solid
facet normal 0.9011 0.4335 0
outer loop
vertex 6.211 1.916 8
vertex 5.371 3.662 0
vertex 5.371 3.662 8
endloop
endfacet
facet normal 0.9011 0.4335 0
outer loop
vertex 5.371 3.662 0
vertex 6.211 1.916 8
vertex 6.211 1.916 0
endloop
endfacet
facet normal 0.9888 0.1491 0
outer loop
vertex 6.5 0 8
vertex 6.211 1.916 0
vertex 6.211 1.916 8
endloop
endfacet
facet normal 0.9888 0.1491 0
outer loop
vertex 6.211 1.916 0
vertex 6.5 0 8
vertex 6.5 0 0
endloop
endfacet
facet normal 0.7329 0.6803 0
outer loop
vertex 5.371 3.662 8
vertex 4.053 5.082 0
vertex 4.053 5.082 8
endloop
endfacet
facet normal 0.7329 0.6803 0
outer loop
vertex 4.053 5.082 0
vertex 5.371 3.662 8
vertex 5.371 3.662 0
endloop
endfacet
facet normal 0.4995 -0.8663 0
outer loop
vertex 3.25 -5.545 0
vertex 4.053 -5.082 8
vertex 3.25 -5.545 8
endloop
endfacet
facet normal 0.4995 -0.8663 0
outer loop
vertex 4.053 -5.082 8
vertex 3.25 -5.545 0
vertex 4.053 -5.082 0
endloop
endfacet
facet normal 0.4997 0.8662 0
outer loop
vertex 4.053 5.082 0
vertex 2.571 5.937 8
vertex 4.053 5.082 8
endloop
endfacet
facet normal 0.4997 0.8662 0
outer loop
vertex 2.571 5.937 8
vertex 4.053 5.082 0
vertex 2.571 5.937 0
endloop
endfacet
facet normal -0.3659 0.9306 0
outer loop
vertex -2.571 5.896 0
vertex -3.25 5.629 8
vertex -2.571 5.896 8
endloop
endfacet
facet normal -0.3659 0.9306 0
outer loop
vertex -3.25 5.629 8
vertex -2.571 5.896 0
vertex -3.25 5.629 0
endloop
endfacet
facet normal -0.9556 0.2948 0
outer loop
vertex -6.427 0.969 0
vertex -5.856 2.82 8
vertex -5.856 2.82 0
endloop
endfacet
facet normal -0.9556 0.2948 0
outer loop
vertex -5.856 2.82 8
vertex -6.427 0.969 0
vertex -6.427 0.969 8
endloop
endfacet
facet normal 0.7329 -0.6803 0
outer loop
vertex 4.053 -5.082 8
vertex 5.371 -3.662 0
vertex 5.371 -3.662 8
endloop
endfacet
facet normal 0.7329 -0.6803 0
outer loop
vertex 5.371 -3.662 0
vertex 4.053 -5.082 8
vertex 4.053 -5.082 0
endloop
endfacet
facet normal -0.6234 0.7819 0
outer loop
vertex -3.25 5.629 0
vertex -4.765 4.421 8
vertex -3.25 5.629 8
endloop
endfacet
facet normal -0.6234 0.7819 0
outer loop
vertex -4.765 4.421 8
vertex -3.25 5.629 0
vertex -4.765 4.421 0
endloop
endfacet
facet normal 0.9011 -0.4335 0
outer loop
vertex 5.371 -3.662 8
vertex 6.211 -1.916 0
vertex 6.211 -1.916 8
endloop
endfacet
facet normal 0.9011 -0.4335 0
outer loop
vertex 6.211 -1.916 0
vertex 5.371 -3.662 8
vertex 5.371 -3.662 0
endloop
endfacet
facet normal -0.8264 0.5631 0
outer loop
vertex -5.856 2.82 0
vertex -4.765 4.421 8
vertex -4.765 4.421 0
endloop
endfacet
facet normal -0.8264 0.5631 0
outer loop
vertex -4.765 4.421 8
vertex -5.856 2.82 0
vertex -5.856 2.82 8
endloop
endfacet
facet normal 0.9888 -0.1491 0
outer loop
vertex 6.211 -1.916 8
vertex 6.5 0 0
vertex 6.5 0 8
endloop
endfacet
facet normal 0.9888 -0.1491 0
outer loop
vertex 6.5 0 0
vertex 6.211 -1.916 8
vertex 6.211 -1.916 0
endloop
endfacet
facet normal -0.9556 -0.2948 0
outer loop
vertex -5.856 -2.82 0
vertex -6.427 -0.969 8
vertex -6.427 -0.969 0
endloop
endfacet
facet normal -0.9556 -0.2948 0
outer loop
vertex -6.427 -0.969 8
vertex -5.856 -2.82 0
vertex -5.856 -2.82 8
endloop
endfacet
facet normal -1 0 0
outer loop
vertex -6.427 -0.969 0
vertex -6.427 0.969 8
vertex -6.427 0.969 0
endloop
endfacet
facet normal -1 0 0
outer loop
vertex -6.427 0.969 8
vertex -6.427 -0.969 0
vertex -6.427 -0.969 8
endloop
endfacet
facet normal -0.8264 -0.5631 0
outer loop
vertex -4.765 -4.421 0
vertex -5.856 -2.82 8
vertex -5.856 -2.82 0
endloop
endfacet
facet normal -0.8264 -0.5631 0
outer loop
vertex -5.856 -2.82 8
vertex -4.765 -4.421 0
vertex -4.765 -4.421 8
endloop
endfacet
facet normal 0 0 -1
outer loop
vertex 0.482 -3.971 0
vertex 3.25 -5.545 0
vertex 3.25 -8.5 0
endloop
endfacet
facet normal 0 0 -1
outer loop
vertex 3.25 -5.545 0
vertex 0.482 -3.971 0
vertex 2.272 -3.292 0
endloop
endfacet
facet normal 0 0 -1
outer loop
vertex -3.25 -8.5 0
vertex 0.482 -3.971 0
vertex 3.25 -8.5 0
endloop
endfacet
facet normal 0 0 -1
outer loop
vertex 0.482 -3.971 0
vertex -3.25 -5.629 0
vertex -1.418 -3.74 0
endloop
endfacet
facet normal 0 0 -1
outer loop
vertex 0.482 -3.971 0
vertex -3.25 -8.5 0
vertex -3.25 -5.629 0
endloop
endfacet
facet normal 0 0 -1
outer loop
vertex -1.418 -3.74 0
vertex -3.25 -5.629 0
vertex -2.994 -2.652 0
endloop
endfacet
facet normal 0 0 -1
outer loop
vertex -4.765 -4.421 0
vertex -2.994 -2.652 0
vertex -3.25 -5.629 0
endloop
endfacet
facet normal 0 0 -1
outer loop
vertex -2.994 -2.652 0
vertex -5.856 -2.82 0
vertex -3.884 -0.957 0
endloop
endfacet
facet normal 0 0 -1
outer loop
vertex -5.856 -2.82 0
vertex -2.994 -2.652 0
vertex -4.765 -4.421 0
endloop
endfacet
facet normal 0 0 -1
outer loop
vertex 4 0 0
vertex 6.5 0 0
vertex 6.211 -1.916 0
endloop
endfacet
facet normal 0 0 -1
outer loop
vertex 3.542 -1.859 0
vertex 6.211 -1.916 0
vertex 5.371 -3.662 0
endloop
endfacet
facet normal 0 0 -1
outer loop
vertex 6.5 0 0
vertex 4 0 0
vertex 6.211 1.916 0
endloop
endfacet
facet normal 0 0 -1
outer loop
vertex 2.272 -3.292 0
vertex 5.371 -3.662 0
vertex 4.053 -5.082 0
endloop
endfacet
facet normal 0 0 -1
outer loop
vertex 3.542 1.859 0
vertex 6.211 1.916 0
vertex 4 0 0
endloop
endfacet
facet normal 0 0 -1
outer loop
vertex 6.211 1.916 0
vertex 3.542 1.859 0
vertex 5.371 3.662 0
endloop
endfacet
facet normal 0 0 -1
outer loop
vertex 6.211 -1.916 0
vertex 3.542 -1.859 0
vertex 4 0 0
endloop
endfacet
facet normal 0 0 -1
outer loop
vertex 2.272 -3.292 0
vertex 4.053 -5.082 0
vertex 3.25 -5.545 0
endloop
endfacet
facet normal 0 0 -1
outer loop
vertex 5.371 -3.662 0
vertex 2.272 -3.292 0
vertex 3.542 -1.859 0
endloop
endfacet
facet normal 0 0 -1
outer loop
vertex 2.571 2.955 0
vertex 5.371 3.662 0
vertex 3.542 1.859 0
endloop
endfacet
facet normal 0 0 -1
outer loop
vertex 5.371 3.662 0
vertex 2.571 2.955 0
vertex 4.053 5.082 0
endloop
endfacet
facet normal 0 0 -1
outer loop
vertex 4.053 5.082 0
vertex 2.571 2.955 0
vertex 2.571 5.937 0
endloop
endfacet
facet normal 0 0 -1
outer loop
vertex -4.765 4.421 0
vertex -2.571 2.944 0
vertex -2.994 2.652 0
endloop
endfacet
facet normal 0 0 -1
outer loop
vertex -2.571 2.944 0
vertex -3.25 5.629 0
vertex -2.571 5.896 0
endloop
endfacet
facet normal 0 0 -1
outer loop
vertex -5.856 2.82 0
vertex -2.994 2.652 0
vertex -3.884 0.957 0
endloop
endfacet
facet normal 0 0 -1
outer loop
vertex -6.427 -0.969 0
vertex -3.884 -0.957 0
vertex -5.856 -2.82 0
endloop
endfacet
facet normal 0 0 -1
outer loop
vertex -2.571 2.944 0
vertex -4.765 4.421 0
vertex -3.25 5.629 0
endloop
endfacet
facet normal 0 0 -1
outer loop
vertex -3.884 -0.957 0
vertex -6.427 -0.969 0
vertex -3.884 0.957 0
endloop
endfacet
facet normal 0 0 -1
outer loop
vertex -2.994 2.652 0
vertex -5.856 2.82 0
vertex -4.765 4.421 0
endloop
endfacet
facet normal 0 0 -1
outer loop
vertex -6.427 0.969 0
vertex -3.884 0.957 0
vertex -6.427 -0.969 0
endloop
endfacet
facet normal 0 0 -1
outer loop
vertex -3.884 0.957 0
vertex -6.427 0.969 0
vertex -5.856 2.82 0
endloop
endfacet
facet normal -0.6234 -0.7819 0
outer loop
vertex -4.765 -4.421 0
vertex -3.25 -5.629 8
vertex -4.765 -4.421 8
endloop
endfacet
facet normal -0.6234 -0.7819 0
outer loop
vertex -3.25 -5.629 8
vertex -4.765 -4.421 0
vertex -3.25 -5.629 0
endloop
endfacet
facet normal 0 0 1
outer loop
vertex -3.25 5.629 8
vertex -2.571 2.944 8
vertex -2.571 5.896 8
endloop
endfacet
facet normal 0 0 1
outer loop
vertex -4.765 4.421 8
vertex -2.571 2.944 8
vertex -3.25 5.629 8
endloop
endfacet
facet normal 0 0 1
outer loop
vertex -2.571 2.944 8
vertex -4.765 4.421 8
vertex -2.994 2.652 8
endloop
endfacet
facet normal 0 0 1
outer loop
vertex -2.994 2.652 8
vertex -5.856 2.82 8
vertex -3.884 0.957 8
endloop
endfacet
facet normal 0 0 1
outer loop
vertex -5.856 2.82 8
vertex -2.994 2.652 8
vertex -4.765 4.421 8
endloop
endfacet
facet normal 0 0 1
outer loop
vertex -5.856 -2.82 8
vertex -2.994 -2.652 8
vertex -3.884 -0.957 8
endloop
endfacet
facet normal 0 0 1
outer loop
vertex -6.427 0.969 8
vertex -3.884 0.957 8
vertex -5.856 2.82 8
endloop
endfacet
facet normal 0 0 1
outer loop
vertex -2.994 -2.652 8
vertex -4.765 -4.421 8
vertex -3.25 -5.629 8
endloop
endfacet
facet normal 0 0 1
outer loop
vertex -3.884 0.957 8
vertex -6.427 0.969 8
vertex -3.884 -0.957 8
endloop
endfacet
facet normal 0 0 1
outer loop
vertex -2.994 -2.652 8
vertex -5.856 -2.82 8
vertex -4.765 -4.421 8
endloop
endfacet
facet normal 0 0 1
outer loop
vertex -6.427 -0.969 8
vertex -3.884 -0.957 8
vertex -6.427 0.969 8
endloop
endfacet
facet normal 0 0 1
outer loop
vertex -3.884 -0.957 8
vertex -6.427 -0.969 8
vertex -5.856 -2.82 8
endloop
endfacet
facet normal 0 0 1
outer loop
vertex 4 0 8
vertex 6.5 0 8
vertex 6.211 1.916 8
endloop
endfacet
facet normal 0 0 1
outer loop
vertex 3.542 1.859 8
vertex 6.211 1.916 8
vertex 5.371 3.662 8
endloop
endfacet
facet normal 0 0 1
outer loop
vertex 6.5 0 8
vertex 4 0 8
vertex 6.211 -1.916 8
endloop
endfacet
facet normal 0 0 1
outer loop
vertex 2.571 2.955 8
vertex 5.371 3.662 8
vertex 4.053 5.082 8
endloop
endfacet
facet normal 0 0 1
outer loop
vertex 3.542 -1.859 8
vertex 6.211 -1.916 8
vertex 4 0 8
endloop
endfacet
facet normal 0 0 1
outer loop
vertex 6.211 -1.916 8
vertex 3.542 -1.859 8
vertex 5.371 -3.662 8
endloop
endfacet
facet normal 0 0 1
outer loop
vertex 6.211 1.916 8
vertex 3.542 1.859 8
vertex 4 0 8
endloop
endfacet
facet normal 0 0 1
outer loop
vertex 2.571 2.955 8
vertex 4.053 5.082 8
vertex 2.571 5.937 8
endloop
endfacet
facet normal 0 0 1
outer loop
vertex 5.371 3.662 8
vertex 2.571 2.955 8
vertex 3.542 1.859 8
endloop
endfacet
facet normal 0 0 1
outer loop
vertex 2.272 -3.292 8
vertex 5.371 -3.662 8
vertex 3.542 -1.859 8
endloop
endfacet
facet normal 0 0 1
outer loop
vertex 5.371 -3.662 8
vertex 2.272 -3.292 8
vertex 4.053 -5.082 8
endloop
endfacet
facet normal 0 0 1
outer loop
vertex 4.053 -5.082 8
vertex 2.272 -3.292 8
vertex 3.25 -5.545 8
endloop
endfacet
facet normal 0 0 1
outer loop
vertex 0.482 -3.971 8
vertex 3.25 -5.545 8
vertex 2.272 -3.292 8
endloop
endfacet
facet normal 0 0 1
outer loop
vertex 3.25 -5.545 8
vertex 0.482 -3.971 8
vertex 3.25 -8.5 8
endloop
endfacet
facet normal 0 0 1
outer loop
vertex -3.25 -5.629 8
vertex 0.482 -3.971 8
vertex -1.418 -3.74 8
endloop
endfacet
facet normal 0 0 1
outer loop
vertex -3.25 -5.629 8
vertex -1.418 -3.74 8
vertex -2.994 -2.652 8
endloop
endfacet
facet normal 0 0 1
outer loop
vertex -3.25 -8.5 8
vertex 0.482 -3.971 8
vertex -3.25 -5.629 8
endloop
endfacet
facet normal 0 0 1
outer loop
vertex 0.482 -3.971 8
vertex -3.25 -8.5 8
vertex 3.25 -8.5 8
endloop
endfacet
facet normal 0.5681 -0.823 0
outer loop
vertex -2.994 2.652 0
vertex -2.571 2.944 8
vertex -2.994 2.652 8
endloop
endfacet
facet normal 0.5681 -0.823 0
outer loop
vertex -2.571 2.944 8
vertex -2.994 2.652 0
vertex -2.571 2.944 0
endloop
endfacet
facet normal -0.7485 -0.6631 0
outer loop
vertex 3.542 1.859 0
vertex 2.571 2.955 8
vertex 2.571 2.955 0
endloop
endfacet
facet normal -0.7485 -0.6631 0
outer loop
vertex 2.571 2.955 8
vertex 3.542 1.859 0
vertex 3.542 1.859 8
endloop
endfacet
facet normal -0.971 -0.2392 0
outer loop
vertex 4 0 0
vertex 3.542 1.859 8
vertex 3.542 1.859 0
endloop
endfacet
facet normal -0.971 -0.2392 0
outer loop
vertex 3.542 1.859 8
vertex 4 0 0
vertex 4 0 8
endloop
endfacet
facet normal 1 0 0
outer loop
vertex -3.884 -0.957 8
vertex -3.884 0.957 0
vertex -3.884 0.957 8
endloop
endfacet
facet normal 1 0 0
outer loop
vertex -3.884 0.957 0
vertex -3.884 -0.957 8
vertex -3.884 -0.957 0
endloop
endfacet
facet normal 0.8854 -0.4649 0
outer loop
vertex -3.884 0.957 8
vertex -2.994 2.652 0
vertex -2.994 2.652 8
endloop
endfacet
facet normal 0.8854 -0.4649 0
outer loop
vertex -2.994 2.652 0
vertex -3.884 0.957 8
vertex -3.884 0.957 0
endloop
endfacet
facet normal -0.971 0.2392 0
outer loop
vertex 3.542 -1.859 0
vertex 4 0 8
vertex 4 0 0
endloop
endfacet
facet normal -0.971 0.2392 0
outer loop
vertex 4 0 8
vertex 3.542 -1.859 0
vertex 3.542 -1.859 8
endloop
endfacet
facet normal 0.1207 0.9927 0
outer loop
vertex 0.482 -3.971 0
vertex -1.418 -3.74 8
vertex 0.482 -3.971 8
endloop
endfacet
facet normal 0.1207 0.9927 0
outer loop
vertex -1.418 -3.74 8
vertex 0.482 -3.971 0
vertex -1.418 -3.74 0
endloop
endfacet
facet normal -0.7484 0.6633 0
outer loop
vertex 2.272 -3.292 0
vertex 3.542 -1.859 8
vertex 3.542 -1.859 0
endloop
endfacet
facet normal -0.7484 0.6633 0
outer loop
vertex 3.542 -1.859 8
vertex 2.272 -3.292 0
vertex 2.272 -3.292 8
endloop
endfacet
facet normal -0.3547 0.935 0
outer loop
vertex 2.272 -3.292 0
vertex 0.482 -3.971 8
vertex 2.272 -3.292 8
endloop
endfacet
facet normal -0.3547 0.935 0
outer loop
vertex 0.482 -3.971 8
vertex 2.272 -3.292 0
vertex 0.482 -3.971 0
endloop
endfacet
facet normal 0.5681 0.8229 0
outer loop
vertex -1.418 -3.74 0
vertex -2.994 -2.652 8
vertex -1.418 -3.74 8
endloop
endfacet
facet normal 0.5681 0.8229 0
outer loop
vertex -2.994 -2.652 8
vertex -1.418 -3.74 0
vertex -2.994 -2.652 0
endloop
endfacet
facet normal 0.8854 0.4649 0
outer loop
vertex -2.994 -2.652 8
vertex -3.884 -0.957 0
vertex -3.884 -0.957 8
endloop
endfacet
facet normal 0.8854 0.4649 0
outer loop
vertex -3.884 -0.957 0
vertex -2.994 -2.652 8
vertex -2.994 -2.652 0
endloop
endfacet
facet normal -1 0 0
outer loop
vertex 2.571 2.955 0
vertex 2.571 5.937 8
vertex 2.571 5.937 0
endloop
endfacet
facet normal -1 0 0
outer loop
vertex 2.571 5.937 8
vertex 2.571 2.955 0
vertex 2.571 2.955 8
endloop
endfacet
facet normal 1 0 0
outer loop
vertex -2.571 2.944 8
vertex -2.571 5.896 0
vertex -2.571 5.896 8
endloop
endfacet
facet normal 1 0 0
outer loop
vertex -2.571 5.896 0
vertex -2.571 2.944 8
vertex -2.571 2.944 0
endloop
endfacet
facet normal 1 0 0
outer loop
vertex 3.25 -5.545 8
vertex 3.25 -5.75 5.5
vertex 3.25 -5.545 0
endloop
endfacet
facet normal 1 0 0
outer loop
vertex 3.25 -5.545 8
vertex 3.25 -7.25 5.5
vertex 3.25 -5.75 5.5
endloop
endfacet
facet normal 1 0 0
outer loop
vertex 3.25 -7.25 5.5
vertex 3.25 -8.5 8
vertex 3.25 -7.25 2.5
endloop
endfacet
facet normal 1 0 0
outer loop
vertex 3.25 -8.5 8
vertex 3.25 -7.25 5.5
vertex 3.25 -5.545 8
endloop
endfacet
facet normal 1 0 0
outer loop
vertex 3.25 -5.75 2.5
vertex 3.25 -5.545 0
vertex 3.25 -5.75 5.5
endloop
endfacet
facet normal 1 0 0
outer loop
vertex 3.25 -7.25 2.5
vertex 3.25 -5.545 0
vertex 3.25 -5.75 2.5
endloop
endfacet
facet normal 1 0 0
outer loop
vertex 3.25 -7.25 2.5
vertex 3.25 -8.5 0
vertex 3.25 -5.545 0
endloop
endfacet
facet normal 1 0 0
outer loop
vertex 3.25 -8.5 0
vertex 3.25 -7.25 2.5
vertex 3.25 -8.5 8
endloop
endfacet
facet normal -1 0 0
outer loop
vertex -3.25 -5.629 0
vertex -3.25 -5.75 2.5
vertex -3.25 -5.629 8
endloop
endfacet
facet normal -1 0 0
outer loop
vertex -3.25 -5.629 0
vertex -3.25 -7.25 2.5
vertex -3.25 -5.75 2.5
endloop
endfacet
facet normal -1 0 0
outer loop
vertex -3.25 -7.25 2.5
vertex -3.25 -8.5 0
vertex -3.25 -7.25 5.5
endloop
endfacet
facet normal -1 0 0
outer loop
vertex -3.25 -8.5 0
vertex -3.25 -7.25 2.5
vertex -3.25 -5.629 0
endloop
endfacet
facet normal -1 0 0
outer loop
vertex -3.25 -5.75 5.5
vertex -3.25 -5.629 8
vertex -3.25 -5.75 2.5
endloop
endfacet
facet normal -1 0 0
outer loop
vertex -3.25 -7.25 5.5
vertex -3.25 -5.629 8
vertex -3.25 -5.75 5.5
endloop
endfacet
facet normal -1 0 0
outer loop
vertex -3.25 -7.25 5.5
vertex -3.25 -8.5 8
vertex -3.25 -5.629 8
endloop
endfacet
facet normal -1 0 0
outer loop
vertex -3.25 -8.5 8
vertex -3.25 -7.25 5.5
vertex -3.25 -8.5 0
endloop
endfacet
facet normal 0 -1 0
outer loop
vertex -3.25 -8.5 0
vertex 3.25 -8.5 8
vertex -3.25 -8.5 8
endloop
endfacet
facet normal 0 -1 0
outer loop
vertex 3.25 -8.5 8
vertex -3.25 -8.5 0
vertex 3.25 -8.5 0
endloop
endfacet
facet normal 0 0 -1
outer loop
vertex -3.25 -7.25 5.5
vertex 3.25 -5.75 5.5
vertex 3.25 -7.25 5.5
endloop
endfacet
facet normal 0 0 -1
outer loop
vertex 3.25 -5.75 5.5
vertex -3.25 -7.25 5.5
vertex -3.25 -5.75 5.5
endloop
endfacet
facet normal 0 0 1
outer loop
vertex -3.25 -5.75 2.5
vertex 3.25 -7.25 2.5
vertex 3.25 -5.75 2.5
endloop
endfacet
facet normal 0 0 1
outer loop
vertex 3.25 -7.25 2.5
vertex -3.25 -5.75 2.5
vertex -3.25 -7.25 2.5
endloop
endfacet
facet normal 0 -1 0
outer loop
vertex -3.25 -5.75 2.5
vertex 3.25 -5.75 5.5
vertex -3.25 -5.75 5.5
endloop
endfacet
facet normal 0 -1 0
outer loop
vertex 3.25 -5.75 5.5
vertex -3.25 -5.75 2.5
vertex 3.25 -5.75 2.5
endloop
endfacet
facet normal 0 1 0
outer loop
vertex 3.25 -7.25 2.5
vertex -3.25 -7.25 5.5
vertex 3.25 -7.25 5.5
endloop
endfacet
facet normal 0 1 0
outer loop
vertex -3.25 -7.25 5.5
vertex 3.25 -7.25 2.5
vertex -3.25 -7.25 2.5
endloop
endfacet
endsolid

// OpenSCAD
//-----------------------------------------------------------------
//-  Endstop clamp, derived from the Prusa decorator clamps
//--  (c) Juan Gonzalez Gomez (Obijuan) juan@iearobotics.com, 
//--  April 2013
//-----------------------------------------------------------------

X = 0;
Y = 1;
Z = 2;

//-- Clamp parameters
rod_diam = 8;
clamp_diam = rod_diam + 5;
open_angle = 80;
width = 8;
base_lx = 6.5;
base_ly = 4;
base_lz = width;

zip_tie_holes = [clamp_diam, 1.5, 3];

//-- Internal parameters
open_x = 2*(rod_diam/2)*sin(open_angle/2);

module Prusa_clamp() 
{
  union() {

    //-- Clamp
    difference() {
      //-- outer cylinder
      cylinder(r=clamp_diam/2, h=width);

      //-- Inner cylinder
      cylinder(r=rod_diam/2, h=width+10,center=true);

      //-- Break the ring substracting a cube
      translate([-open_x/2,0,-1])
      cube([open_x, clamp_diam+10, width+2]);
    }

    //-- clamp Base
    translate([0,-clamp_diam/2,base_lz/2])
    cube([base_lx, base_ly, base_lz], center=true);
  }
}


//---  Endstop holder

difference() {

  Prusa_clamp();
  translate([0,
           - clamp_diam/2,
           base_lz/2])
    cube(zip_tie_holes, center=true);
}
